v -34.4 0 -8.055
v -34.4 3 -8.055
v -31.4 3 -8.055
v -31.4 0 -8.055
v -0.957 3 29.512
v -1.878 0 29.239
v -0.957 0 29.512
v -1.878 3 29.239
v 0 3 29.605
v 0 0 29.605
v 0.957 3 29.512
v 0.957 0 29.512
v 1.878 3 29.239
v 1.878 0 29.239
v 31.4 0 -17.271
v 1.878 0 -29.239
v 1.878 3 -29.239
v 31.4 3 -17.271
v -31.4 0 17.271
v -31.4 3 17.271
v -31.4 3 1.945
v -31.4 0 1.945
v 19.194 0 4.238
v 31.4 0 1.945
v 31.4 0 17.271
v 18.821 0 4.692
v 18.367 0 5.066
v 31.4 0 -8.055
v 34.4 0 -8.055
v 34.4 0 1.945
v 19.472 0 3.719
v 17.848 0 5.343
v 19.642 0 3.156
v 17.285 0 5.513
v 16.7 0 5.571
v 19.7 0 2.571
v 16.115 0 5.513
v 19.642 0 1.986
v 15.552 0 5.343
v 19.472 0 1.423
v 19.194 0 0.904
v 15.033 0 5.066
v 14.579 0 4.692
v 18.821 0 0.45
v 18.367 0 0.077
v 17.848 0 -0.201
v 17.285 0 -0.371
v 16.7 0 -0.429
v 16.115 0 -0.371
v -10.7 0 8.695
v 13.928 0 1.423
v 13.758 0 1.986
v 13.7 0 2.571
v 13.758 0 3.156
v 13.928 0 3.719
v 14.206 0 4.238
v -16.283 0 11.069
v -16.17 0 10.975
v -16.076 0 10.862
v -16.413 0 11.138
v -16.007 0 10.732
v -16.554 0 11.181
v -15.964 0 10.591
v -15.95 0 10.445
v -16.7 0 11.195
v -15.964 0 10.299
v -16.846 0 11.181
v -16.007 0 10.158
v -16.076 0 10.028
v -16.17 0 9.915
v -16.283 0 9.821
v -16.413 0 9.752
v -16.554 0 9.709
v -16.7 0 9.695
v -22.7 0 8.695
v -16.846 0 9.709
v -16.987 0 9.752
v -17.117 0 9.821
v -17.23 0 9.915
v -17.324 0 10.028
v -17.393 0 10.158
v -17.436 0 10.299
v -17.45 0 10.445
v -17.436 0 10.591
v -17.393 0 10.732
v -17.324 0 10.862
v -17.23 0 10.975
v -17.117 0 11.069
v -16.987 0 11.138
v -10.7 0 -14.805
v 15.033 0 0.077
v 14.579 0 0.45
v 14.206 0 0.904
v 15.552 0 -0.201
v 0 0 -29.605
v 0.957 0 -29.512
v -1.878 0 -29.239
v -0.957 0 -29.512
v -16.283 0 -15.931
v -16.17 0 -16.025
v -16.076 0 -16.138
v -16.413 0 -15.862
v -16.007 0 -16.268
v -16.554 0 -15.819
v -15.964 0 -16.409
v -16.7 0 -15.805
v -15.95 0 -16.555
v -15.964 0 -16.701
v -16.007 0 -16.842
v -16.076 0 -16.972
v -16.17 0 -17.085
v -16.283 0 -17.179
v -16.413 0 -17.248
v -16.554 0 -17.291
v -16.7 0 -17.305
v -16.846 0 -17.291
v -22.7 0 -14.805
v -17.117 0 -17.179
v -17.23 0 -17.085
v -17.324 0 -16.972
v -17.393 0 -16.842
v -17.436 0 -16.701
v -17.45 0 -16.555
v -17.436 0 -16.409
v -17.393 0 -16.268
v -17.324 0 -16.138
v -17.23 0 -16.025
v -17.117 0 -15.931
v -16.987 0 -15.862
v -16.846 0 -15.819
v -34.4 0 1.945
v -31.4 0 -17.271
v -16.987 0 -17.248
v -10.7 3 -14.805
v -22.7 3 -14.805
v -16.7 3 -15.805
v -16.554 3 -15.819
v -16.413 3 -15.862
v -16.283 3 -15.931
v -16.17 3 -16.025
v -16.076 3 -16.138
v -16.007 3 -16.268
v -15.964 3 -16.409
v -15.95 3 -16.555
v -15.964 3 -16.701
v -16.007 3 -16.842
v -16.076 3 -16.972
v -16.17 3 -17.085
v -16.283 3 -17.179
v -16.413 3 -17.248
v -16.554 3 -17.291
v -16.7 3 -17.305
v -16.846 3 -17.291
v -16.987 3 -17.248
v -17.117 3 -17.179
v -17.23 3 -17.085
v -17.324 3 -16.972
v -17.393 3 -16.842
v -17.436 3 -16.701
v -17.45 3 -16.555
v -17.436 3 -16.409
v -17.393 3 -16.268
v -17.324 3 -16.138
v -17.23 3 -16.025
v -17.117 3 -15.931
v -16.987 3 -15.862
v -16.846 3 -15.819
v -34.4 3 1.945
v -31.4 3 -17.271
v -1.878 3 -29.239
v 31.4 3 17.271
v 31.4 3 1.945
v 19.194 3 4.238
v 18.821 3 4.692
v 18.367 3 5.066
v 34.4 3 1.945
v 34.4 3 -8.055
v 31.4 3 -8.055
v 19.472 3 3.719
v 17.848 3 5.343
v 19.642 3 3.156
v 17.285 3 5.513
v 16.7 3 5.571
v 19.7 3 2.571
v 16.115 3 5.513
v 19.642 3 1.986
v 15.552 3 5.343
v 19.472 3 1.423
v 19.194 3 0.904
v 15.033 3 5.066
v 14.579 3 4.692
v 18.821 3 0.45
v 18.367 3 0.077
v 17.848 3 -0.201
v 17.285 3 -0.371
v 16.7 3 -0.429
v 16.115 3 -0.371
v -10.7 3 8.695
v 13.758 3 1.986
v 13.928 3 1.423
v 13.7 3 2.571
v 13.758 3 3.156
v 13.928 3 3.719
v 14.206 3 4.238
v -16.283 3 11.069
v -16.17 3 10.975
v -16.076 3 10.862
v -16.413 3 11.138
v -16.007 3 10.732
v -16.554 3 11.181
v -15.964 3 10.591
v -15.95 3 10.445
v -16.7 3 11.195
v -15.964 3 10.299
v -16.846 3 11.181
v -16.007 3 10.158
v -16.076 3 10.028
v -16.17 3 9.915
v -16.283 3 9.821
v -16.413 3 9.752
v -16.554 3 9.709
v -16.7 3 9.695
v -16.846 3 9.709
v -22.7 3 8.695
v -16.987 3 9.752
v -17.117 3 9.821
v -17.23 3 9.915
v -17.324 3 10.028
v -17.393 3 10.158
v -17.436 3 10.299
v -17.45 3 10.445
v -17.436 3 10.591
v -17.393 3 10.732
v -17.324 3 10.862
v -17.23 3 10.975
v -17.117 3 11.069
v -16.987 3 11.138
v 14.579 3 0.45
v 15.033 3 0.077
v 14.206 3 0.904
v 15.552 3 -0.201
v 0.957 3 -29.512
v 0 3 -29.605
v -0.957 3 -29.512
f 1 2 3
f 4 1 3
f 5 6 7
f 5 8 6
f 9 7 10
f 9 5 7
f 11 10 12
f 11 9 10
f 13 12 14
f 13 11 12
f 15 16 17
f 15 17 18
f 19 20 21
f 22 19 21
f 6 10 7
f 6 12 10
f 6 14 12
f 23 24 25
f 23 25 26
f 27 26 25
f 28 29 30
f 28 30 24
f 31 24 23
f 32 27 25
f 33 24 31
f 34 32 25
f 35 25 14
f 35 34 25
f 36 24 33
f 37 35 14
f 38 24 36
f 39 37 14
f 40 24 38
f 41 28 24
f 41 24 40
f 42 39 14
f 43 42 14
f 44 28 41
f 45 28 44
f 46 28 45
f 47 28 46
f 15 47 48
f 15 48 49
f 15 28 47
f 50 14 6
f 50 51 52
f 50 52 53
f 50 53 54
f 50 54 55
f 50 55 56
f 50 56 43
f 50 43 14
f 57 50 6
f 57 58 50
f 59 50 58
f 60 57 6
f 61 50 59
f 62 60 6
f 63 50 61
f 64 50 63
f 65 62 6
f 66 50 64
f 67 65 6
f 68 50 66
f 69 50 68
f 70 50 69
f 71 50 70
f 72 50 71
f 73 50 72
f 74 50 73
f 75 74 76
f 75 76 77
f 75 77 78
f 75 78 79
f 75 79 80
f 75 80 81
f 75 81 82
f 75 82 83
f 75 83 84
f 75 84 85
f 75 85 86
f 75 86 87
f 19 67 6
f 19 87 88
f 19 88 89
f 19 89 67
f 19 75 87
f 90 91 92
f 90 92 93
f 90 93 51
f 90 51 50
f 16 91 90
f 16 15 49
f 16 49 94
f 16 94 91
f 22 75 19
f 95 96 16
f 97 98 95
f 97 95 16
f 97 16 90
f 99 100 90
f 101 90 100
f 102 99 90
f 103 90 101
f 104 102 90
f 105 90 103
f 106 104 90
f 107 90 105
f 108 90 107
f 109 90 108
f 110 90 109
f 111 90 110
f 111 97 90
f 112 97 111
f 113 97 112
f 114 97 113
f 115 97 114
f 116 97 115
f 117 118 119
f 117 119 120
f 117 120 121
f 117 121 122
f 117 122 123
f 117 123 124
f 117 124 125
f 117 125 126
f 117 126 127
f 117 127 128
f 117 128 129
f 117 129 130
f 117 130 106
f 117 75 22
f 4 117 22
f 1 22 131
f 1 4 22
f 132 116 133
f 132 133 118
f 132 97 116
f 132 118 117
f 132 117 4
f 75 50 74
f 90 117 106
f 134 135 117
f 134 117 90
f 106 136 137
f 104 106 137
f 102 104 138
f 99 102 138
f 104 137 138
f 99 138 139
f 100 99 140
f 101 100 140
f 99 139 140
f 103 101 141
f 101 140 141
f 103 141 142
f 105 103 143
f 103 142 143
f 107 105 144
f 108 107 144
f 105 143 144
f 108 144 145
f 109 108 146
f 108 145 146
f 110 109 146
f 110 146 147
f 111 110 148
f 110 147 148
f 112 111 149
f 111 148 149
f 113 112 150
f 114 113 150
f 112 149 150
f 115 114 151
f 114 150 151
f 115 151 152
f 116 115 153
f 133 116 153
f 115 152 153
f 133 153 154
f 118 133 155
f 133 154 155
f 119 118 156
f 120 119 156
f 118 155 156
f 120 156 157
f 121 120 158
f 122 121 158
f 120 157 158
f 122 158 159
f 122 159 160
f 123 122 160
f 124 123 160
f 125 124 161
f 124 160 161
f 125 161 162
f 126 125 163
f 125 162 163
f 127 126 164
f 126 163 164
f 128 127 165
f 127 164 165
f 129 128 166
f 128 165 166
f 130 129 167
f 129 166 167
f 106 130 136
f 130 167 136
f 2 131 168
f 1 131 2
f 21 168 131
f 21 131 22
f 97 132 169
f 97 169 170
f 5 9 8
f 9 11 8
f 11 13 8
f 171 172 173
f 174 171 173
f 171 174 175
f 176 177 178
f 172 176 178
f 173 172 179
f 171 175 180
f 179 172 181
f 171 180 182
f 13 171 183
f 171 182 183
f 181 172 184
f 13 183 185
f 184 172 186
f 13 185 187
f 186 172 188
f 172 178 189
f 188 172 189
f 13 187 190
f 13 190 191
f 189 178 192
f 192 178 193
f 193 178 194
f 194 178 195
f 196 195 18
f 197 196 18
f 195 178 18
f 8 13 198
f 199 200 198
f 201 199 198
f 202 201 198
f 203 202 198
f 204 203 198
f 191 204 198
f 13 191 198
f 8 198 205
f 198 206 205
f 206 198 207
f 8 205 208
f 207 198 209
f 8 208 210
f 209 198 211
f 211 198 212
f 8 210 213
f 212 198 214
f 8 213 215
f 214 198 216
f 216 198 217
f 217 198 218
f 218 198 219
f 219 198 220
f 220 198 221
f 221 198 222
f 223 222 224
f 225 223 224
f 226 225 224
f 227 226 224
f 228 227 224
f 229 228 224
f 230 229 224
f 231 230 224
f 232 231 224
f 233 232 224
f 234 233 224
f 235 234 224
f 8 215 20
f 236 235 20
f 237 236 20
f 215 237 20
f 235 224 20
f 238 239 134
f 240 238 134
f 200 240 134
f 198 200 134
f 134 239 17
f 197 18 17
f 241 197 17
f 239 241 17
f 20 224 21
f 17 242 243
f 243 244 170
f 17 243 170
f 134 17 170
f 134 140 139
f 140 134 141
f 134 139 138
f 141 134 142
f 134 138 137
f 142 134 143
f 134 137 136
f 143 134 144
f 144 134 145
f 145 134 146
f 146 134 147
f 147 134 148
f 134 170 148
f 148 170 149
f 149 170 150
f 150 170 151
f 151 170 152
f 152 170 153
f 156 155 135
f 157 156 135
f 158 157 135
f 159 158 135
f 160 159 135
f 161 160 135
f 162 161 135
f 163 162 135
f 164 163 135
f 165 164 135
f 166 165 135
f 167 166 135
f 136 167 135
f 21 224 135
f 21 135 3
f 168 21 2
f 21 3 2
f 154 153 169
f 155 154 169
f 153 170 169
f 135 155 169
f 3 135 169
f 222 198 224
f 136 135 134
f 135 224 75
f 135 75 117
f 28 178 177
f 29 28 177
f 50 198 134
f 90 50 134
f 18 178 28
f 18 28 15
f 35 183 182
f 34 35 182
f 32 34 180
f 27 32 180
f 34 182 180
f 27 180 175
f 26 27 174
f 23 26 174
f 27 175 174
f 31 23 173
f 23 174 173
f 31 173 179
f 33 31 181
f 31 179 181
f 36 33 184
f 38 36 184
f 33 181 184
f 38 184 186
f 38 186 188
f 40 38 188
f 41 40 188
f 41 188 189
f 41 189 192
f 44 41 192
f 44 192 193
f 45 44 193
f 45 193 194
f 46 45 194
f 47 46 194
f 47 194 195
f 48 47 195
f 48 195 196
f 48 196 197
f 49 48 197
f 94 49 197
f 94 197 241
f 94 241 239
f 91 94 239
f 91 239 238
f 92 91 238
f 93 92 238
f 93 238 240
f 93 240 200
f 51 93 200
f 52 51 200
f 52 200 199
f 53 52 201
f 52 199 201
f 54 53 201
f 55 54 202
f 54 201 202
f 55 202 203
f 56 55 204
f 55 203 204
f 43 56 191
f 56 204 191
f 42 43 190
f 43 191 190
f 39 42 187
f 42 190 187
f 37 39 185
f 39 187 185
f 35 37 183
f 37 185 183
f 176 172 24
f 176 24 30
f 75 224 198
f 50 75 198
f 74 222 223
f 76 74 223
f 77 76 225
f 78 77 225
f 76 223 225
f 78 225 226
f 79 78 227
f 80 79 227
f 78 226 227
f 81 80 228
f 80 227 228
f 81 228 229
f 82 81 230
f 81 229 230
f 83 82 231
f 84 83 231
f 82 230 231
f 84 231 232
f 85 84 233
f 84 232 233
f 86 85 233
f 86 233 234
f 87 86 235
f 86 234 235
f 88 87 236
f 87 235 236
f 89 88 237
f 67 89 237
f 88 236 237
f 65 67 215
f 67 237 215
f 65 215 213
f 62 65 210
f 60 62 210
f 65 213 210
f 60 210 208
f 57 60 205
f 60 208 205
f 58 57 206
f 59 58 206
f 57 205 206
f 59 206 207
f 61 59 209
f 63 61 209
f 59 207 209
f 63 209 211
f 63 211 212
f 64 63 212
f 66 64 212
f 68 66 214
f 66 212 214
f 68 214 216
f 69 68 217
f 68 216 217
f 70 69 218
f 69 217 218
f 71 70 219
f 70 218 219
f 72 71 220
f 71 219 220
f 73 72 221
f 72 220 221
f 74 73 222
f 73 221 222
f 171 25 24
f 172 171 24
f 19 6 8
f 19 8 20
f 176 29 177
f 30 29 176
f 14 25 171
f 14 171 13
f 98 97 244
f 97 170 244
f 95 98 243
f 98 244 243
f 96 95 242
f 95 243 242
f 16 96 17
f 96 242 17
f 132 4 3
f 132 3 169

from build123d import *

# Parameters (mm, degrees)
BOSS_EXTRUDE4_DEPTH      = 3
SKETCH8_W                = 3
SKETCH8_H                = 8
SKETCH8_H_2              = 14.11
CUT_EXTRUDE5_DEPTH       = 3
SKETCH9_R                = 0.75
SKETCH9_W                = 12
SKETCH9_H                = 23.5
CUT_EXTRUDE6_DEPTH       = 3
FILLET2_R                = 5
SPLIT1_SURFACE_1_1_BACK  = 91.82
SPLIT1_SURFACE_1_1_DEPTH = 183.64
SPLIT1_SURFACE_1_2_BACK  = 91.82
SPLIT1_SURFACE_1_2_DEPTH = 183.64
SPLIT1_SURFACE_2_3_BACK  = 91.82
SPLIT1_SURFACE_2_3_DEPTH = 183.64
SPLIT1_SURFACE_2_4_BACK  = 91.82
SPLIT1_SURFACE_2_4_DEPTH = 183.64
SPLIT1_SURFACE_3_5_BACK  = 91.82
SPLIT1_SURFACE_3_5_DEPTH = 183.64
SPLIT1_SURFACE_3_6_BACK  = 91.82
SPLIT1_SURFACE_3_6_DEPTH = 183.64
SPLIT1_SURFACE_4_7_BACK  = 91.82
SPLIT1_SURFACE_4_7_DEPTH = 183.64
SPLIT1_SURFACE_4_8_BACK  = 91.82
SPLIT1_SURFACE_4_8_DEPTH = 183.64
SKETCH11_R               = 3
CUT_EXTRUDE7_DEPTH       = 10


with BuildPart() as part:
    # Sketch6 → Boss-Extrude4 (new body)
    with BuildSketch(Plane(origin=(0, 0, 0), x_dir=(1, 0, 0), z_dir=(0, 1, 0))):
        Polygon((-34.4, 16.055), (0, 30), (34.4, 16.055), (34.4, -16.055), (0, -30), (-34.4, -16.055), align=None)
    extrude(amount=BOSS_EXTRUDE4_DEPTH)

    # Sketch8 → Cut-Extrude5 (cut)
    with BuildSketch(Plane(origin=(0, 3, 0), x_dir=(1, 0, 0), z_dir=(0, 1, 0))):
        with Locations((32.9, 12.055)):
            Rectangle(SKETCH8_W, SKETCH8_H)
        with Locations((32.9, -9)):
            Rectangle(SKETCH8_W, SKETCH8_H_2)
        with Locations((-32.9, -9)):
            Rectangle(SKETCH8_W, SKETCH8_H_2)
        with Locations((-32.9, 12.055)):
            Rectangle(SKETCH8_W, SKETCH8_H)
    extrude(amount=-CUT_EXTRUDE5_DEPTH, mode=Mode.SUBTRACT)

    # Sketch9 → Cut-Extrude6 (cut)
    with BuildSketch(Plane(origin=(0, 3, 0), x_dir=(1, 0, 0), z_dir=(0, 1, 0))):
        with Locations(Location((-16.7, 16.555, 0), (0, 0, 270))):
            Circle(SKETCH9_R)
        with Locations(Location((-16.7, -10.445, 0), (0, 0, 90))):
            Circle(SKETCH9_R)
        with Locations((-16.7, 3.055)):
            Rectangle(SKETCH9_W, SKETCH9_H)
    extrude(amount=-CUT_EXTRUDE6_DEPTH, mode=Mode.SUBTRACT)

    # Fillet2
    fillet2_edges = [part.edges().sort_by_distance(p)[0] for p in [
        (0, 1.5, -30),
        (0, 1.5, 30),
    ]]
    fillet(fillet2_edges, radius=FILLET2_R)


with BuildPart() as body_2:
    # Split1: the piece behind the surface
    add(part.part)
    # Split1 surface 1: a surface, the sketch's curves swept straight by 183.64 mm
    with BuildLine(Plane(origin=(0, 3, 0), x_dir=(1, 0, 0), z_dir=(0, 1, 0)).offset(-SPLIT1_SURFACE_1_1_BACK), mode=Mode.PRIVATE) as split1_surface_1_1_path:
        Line((34.4, 16.055), (31.4, 16.055))
        Line((31.4, 16.055), (31.4, 17.271133721))
        Line((31.4, 17.271133721), (34.4, 16.055))
    split1_surface_1_1 = Shell.extrude(split1_surface_1_1_path.wire(), (0 * SPLIT1_SURFACE_1_1_DEPTH, 1 * SPLIT1_SURFACE_1_1_DEPTH, 0 * SPLIT1_SURFACE_1_1_DEPTH))
    split(bisect_by=split1_surface_1_1, keep=Keep.BOTTOM)


with BuildPart() as part_1:
    add(part.part)

    # Split1: split by a surface, the side it looks to stays
    # Split1 surface 1: a surface, the sketch's curves swept straight by 183.64 mm
    with BuildLine(Plane(origin=(0, 3, 0), x_dir=(1, 0, 0), z_dir=(0, 1, 0)).offset(-SPLIT1_SURFACE_1_2_BACK), mode=Mode.PRIVATE) as split1_surface_1_2_path:
        Line((34.4, 16.055), (31.4, 16.055))
        Line((31.4, 16.055), (31.4, 17.271133721))
        Line((31.4, 17.271133721), (34.4, 16.055))
    split1_surface_1_2 = Shell.extrude(split1_surface_1_2_path.wire(), (0 * SPLIT1_SURFACE_1_2_DEPTH, 1 * SPLIT1_SURFACE_1_2_DEPTH, 0 * SPLIT1_SURFACE_1_2_DEPTH))
    split(bisect_by=split1_surface_1_2, keep=Keep.TOP)


with BuildPart() as body_3:
    # Split1 2: the piece behind the surface
    add(part_1.part)
    # Split1 surface 2: a surface, the sketch's curves swept straight by 183.64 mm
    with BuildLine(Plane(origin=(0, 3, 0), x_dir=(1, 0, 0), z_dir=(0, 1, 0)).offset(-SPLIT1_SURFACE_2_3_BACK), mode=Mode.PRIVATE) as split1_surface_2_3_path:
        Line((31.4, -17.271133721), (31.4, -16.055))
        Line((31.4, -16.055), (34.4, -16.055))
        Line((34.4, -16.055), (31.4, -17.271133721))
    split1_surface_2_3 = Shell.extrude(split1_surface_2_3_path.wire(), (0 * SPLIT1_SURFACE_2_3_DEPTH, 1 * SPLIT1_SURFACE_2_3_DEPTH, 0 * SPLIT1_SURFACE_2_3_DEPTH))
    split(bisect_by=split1_surface_2_3, keep=Keep.BOTTOM)


with BuildPart() as part_2:
    add(part_1.part)

    # Split1 2: split by a surface, the side it looks to stays
    # Split1 surface 2: a surface, the sketch's curves swept straight by 183.64 mm
    with BuildLine(Plane(origin=(0, 3, 0), x_dir=(1, 0, 0), z_dir=(0, 1, 0)).offset(-SPLIT1_SURFACE_2_4_BACK), mode=Mode.PRIVATE) as split1_surface_2_4_path:
        Line((31.4, -17.271133721), (31.4, -16.055))
        Line((31.4, -16.055), (34.4, -16.055))
        Line((34.4, -16.055), (31.4, -17.271133721))
    split1_surface_2_4 = Shell.extrude(split1_surface_2_4_path.wire(), (0 * SPLIT1_SURFACE_2_4_DEPTH, 1 * SPLIT1_SURFACE_2_4_DEPTH, 0 * SPLIT1_SURFACE_2_4_DEPTH))
    split(bisect_by=split1_surface_2_4, keep=Keep.TOP)


with BuildPart() as body_4_2:
    # Split1 3: the piece behind the surface
    add(part_2.part)
    # Split1 surface 3: a surface, the sketch's curves swept straight by 183.64 mm
    with BuildLine(Plane(origin=(0, 3, 0), x_dir=(1, 0, 0), z_dir=(0, 1, 0)).offset(-SPLIT1_SURFACE_3_5_BACK), mode=Mode.PRIVATE) as split1_surface_3_5_path:
        Line((-31.4, -17.271133721), (-31.4, -16.055))
        Line((-31.4, -16.055), (-34.4, -16.055))
        Line((-34.4, -16.055), (-31.4, -17.271133721))
    split1_surface_3_5 = Shell.extrude(split1_surface_3_5_path.wire(), (0 * SPLIT1_SURFACE_3_5_DEPTH, 1 * SPLIT1_SURFACE_3_5_DEPTH, 0 * SPLIT1_SURFACE_3_5_DEPTH))
    split(bisect_by=split1_surface_3_5, keep=Keep.BOTTOM)


with BuildPart() as part_3:
    add(part_2.part)

    # Split1 3: split by a surface, the side it looks to stays
    # Split1 surface 3: a surface, the sketch's curves swept straight by 183.64 mm
    with BuildLine(Plane(origin=(0, 3, 0), x_dir=(1, 0, 0), z_dir=(0, 1, 0)).offset(-SPLIT1_SURFACE_3_6_BACK), mode=Mode.PRIVATE) as split1_surface_3_6_path:
        Line((-31.4, -17.271133721), (-31.4, -16.055))
        Line((-31.4, -16.055), (-34.4, -16.055))
        Line((-34.4, -16.055), (-31.4, -17.271133721))
    split1_surface_3_6 = Shell.extrude(split1_surface_3_6_path.wire(), (0 * SPLIT1_SURFACE_3_6_DEPTH, 1 * SPLIT1_SURFACE_3_6_DEPTH, 0 * SPLIT1_SURFACE_3_6_DEPTH))
    split(bisect_by=split1_surface_3_6, keep=Keep.TOP)


with BuildPart() as body_5_2:
    # Split1 4 body 4 2: the piece behind the surface
    add(body_4_2.part)
    # Split1 surface 4: a surface, the sketch's curves swept straight by 183.64 mm
    with BuildLine(Plane(origin=(0, 3, 0), x_dir=(1, 0, 0), z_dir=(0, 1, 0)).offset(-SPLIT1_SURFACE_4_7_BACK), mode=Mode.PRIVATE) as split1_surface_4_7_path:
        Line((-34.4, 16.055), (-31.4, 16.055))
        Line((-31.4, 16.055), (-31.4, 17.271133721))
        Line((-31.4, 17.271133721), (-34.4, 16.055))
    split1_surface_4_7 = Shell.extrude(split1_surface_4_7_path.wire(), (0 * SPLIT1_SURFACE_4_7_DEPTH, 1 * SPLIT1_SURFACE_4_7_DEPTH, 0 * SPLIT1_SURFACE_4_7_DEPTH))
    split(bisect_by=split1_surface_4_7, keep=Keep.BOTTOM)


with BuildPart() as body_4_2_1:
    add(body_4_2.part)

    # Split1 4 body 4 2: split by a surface, the side it looks to stays
    # Split1 surface 4: a surface, the sketch's curves swept straight by 183.64 mm
    with BuildLine(Plane(origin=(0, 3, 0), x_dir=(1, 0, 0), z_dir=(0, 1, 0)).offset(-SPLIT1_SURFACE_4_8_BACK), mode=Mode.PRIVATE) as split1_surface_4_8_path:
        Line((-34.4, 16.055), (-31.4, 16.055))
        Line((-31.4, 16.055), (-31.4, 17.271133721))
        Line((-31.4, 17.271133721), (-34.4, 16.055))
    split1_surface_4_8 = Shell.extrude(split1_surface_4_8_path.wire(), (0 * SPLIT1_SURFACE_4_8_DEPTH, 1 * SPLIT1_SURFACE_4_8_DEPTH, 0 * SPLIT1_SURFACE_4_8_DEPTH))
    split(bisect_by=split1_surface_4_8, keep=Keep.TOP)

    # Sketch11 → Cut-Extrude7 (cut)
    with BuildSketch(Plane(origin=(0, 3, 0), x_dir=(1, 0, 0), z_dir=(0, 1, 0))):
        with Locations(Location((16.7, -2.571133721, 0), (0, 0, 270))):
            Circle(SKETCH11_R)
    extrude(amount=-CUT_EXTRUDE7_DEPTH, mode=Mode.SUBTRACT)


solid = body_4_2_1.part
